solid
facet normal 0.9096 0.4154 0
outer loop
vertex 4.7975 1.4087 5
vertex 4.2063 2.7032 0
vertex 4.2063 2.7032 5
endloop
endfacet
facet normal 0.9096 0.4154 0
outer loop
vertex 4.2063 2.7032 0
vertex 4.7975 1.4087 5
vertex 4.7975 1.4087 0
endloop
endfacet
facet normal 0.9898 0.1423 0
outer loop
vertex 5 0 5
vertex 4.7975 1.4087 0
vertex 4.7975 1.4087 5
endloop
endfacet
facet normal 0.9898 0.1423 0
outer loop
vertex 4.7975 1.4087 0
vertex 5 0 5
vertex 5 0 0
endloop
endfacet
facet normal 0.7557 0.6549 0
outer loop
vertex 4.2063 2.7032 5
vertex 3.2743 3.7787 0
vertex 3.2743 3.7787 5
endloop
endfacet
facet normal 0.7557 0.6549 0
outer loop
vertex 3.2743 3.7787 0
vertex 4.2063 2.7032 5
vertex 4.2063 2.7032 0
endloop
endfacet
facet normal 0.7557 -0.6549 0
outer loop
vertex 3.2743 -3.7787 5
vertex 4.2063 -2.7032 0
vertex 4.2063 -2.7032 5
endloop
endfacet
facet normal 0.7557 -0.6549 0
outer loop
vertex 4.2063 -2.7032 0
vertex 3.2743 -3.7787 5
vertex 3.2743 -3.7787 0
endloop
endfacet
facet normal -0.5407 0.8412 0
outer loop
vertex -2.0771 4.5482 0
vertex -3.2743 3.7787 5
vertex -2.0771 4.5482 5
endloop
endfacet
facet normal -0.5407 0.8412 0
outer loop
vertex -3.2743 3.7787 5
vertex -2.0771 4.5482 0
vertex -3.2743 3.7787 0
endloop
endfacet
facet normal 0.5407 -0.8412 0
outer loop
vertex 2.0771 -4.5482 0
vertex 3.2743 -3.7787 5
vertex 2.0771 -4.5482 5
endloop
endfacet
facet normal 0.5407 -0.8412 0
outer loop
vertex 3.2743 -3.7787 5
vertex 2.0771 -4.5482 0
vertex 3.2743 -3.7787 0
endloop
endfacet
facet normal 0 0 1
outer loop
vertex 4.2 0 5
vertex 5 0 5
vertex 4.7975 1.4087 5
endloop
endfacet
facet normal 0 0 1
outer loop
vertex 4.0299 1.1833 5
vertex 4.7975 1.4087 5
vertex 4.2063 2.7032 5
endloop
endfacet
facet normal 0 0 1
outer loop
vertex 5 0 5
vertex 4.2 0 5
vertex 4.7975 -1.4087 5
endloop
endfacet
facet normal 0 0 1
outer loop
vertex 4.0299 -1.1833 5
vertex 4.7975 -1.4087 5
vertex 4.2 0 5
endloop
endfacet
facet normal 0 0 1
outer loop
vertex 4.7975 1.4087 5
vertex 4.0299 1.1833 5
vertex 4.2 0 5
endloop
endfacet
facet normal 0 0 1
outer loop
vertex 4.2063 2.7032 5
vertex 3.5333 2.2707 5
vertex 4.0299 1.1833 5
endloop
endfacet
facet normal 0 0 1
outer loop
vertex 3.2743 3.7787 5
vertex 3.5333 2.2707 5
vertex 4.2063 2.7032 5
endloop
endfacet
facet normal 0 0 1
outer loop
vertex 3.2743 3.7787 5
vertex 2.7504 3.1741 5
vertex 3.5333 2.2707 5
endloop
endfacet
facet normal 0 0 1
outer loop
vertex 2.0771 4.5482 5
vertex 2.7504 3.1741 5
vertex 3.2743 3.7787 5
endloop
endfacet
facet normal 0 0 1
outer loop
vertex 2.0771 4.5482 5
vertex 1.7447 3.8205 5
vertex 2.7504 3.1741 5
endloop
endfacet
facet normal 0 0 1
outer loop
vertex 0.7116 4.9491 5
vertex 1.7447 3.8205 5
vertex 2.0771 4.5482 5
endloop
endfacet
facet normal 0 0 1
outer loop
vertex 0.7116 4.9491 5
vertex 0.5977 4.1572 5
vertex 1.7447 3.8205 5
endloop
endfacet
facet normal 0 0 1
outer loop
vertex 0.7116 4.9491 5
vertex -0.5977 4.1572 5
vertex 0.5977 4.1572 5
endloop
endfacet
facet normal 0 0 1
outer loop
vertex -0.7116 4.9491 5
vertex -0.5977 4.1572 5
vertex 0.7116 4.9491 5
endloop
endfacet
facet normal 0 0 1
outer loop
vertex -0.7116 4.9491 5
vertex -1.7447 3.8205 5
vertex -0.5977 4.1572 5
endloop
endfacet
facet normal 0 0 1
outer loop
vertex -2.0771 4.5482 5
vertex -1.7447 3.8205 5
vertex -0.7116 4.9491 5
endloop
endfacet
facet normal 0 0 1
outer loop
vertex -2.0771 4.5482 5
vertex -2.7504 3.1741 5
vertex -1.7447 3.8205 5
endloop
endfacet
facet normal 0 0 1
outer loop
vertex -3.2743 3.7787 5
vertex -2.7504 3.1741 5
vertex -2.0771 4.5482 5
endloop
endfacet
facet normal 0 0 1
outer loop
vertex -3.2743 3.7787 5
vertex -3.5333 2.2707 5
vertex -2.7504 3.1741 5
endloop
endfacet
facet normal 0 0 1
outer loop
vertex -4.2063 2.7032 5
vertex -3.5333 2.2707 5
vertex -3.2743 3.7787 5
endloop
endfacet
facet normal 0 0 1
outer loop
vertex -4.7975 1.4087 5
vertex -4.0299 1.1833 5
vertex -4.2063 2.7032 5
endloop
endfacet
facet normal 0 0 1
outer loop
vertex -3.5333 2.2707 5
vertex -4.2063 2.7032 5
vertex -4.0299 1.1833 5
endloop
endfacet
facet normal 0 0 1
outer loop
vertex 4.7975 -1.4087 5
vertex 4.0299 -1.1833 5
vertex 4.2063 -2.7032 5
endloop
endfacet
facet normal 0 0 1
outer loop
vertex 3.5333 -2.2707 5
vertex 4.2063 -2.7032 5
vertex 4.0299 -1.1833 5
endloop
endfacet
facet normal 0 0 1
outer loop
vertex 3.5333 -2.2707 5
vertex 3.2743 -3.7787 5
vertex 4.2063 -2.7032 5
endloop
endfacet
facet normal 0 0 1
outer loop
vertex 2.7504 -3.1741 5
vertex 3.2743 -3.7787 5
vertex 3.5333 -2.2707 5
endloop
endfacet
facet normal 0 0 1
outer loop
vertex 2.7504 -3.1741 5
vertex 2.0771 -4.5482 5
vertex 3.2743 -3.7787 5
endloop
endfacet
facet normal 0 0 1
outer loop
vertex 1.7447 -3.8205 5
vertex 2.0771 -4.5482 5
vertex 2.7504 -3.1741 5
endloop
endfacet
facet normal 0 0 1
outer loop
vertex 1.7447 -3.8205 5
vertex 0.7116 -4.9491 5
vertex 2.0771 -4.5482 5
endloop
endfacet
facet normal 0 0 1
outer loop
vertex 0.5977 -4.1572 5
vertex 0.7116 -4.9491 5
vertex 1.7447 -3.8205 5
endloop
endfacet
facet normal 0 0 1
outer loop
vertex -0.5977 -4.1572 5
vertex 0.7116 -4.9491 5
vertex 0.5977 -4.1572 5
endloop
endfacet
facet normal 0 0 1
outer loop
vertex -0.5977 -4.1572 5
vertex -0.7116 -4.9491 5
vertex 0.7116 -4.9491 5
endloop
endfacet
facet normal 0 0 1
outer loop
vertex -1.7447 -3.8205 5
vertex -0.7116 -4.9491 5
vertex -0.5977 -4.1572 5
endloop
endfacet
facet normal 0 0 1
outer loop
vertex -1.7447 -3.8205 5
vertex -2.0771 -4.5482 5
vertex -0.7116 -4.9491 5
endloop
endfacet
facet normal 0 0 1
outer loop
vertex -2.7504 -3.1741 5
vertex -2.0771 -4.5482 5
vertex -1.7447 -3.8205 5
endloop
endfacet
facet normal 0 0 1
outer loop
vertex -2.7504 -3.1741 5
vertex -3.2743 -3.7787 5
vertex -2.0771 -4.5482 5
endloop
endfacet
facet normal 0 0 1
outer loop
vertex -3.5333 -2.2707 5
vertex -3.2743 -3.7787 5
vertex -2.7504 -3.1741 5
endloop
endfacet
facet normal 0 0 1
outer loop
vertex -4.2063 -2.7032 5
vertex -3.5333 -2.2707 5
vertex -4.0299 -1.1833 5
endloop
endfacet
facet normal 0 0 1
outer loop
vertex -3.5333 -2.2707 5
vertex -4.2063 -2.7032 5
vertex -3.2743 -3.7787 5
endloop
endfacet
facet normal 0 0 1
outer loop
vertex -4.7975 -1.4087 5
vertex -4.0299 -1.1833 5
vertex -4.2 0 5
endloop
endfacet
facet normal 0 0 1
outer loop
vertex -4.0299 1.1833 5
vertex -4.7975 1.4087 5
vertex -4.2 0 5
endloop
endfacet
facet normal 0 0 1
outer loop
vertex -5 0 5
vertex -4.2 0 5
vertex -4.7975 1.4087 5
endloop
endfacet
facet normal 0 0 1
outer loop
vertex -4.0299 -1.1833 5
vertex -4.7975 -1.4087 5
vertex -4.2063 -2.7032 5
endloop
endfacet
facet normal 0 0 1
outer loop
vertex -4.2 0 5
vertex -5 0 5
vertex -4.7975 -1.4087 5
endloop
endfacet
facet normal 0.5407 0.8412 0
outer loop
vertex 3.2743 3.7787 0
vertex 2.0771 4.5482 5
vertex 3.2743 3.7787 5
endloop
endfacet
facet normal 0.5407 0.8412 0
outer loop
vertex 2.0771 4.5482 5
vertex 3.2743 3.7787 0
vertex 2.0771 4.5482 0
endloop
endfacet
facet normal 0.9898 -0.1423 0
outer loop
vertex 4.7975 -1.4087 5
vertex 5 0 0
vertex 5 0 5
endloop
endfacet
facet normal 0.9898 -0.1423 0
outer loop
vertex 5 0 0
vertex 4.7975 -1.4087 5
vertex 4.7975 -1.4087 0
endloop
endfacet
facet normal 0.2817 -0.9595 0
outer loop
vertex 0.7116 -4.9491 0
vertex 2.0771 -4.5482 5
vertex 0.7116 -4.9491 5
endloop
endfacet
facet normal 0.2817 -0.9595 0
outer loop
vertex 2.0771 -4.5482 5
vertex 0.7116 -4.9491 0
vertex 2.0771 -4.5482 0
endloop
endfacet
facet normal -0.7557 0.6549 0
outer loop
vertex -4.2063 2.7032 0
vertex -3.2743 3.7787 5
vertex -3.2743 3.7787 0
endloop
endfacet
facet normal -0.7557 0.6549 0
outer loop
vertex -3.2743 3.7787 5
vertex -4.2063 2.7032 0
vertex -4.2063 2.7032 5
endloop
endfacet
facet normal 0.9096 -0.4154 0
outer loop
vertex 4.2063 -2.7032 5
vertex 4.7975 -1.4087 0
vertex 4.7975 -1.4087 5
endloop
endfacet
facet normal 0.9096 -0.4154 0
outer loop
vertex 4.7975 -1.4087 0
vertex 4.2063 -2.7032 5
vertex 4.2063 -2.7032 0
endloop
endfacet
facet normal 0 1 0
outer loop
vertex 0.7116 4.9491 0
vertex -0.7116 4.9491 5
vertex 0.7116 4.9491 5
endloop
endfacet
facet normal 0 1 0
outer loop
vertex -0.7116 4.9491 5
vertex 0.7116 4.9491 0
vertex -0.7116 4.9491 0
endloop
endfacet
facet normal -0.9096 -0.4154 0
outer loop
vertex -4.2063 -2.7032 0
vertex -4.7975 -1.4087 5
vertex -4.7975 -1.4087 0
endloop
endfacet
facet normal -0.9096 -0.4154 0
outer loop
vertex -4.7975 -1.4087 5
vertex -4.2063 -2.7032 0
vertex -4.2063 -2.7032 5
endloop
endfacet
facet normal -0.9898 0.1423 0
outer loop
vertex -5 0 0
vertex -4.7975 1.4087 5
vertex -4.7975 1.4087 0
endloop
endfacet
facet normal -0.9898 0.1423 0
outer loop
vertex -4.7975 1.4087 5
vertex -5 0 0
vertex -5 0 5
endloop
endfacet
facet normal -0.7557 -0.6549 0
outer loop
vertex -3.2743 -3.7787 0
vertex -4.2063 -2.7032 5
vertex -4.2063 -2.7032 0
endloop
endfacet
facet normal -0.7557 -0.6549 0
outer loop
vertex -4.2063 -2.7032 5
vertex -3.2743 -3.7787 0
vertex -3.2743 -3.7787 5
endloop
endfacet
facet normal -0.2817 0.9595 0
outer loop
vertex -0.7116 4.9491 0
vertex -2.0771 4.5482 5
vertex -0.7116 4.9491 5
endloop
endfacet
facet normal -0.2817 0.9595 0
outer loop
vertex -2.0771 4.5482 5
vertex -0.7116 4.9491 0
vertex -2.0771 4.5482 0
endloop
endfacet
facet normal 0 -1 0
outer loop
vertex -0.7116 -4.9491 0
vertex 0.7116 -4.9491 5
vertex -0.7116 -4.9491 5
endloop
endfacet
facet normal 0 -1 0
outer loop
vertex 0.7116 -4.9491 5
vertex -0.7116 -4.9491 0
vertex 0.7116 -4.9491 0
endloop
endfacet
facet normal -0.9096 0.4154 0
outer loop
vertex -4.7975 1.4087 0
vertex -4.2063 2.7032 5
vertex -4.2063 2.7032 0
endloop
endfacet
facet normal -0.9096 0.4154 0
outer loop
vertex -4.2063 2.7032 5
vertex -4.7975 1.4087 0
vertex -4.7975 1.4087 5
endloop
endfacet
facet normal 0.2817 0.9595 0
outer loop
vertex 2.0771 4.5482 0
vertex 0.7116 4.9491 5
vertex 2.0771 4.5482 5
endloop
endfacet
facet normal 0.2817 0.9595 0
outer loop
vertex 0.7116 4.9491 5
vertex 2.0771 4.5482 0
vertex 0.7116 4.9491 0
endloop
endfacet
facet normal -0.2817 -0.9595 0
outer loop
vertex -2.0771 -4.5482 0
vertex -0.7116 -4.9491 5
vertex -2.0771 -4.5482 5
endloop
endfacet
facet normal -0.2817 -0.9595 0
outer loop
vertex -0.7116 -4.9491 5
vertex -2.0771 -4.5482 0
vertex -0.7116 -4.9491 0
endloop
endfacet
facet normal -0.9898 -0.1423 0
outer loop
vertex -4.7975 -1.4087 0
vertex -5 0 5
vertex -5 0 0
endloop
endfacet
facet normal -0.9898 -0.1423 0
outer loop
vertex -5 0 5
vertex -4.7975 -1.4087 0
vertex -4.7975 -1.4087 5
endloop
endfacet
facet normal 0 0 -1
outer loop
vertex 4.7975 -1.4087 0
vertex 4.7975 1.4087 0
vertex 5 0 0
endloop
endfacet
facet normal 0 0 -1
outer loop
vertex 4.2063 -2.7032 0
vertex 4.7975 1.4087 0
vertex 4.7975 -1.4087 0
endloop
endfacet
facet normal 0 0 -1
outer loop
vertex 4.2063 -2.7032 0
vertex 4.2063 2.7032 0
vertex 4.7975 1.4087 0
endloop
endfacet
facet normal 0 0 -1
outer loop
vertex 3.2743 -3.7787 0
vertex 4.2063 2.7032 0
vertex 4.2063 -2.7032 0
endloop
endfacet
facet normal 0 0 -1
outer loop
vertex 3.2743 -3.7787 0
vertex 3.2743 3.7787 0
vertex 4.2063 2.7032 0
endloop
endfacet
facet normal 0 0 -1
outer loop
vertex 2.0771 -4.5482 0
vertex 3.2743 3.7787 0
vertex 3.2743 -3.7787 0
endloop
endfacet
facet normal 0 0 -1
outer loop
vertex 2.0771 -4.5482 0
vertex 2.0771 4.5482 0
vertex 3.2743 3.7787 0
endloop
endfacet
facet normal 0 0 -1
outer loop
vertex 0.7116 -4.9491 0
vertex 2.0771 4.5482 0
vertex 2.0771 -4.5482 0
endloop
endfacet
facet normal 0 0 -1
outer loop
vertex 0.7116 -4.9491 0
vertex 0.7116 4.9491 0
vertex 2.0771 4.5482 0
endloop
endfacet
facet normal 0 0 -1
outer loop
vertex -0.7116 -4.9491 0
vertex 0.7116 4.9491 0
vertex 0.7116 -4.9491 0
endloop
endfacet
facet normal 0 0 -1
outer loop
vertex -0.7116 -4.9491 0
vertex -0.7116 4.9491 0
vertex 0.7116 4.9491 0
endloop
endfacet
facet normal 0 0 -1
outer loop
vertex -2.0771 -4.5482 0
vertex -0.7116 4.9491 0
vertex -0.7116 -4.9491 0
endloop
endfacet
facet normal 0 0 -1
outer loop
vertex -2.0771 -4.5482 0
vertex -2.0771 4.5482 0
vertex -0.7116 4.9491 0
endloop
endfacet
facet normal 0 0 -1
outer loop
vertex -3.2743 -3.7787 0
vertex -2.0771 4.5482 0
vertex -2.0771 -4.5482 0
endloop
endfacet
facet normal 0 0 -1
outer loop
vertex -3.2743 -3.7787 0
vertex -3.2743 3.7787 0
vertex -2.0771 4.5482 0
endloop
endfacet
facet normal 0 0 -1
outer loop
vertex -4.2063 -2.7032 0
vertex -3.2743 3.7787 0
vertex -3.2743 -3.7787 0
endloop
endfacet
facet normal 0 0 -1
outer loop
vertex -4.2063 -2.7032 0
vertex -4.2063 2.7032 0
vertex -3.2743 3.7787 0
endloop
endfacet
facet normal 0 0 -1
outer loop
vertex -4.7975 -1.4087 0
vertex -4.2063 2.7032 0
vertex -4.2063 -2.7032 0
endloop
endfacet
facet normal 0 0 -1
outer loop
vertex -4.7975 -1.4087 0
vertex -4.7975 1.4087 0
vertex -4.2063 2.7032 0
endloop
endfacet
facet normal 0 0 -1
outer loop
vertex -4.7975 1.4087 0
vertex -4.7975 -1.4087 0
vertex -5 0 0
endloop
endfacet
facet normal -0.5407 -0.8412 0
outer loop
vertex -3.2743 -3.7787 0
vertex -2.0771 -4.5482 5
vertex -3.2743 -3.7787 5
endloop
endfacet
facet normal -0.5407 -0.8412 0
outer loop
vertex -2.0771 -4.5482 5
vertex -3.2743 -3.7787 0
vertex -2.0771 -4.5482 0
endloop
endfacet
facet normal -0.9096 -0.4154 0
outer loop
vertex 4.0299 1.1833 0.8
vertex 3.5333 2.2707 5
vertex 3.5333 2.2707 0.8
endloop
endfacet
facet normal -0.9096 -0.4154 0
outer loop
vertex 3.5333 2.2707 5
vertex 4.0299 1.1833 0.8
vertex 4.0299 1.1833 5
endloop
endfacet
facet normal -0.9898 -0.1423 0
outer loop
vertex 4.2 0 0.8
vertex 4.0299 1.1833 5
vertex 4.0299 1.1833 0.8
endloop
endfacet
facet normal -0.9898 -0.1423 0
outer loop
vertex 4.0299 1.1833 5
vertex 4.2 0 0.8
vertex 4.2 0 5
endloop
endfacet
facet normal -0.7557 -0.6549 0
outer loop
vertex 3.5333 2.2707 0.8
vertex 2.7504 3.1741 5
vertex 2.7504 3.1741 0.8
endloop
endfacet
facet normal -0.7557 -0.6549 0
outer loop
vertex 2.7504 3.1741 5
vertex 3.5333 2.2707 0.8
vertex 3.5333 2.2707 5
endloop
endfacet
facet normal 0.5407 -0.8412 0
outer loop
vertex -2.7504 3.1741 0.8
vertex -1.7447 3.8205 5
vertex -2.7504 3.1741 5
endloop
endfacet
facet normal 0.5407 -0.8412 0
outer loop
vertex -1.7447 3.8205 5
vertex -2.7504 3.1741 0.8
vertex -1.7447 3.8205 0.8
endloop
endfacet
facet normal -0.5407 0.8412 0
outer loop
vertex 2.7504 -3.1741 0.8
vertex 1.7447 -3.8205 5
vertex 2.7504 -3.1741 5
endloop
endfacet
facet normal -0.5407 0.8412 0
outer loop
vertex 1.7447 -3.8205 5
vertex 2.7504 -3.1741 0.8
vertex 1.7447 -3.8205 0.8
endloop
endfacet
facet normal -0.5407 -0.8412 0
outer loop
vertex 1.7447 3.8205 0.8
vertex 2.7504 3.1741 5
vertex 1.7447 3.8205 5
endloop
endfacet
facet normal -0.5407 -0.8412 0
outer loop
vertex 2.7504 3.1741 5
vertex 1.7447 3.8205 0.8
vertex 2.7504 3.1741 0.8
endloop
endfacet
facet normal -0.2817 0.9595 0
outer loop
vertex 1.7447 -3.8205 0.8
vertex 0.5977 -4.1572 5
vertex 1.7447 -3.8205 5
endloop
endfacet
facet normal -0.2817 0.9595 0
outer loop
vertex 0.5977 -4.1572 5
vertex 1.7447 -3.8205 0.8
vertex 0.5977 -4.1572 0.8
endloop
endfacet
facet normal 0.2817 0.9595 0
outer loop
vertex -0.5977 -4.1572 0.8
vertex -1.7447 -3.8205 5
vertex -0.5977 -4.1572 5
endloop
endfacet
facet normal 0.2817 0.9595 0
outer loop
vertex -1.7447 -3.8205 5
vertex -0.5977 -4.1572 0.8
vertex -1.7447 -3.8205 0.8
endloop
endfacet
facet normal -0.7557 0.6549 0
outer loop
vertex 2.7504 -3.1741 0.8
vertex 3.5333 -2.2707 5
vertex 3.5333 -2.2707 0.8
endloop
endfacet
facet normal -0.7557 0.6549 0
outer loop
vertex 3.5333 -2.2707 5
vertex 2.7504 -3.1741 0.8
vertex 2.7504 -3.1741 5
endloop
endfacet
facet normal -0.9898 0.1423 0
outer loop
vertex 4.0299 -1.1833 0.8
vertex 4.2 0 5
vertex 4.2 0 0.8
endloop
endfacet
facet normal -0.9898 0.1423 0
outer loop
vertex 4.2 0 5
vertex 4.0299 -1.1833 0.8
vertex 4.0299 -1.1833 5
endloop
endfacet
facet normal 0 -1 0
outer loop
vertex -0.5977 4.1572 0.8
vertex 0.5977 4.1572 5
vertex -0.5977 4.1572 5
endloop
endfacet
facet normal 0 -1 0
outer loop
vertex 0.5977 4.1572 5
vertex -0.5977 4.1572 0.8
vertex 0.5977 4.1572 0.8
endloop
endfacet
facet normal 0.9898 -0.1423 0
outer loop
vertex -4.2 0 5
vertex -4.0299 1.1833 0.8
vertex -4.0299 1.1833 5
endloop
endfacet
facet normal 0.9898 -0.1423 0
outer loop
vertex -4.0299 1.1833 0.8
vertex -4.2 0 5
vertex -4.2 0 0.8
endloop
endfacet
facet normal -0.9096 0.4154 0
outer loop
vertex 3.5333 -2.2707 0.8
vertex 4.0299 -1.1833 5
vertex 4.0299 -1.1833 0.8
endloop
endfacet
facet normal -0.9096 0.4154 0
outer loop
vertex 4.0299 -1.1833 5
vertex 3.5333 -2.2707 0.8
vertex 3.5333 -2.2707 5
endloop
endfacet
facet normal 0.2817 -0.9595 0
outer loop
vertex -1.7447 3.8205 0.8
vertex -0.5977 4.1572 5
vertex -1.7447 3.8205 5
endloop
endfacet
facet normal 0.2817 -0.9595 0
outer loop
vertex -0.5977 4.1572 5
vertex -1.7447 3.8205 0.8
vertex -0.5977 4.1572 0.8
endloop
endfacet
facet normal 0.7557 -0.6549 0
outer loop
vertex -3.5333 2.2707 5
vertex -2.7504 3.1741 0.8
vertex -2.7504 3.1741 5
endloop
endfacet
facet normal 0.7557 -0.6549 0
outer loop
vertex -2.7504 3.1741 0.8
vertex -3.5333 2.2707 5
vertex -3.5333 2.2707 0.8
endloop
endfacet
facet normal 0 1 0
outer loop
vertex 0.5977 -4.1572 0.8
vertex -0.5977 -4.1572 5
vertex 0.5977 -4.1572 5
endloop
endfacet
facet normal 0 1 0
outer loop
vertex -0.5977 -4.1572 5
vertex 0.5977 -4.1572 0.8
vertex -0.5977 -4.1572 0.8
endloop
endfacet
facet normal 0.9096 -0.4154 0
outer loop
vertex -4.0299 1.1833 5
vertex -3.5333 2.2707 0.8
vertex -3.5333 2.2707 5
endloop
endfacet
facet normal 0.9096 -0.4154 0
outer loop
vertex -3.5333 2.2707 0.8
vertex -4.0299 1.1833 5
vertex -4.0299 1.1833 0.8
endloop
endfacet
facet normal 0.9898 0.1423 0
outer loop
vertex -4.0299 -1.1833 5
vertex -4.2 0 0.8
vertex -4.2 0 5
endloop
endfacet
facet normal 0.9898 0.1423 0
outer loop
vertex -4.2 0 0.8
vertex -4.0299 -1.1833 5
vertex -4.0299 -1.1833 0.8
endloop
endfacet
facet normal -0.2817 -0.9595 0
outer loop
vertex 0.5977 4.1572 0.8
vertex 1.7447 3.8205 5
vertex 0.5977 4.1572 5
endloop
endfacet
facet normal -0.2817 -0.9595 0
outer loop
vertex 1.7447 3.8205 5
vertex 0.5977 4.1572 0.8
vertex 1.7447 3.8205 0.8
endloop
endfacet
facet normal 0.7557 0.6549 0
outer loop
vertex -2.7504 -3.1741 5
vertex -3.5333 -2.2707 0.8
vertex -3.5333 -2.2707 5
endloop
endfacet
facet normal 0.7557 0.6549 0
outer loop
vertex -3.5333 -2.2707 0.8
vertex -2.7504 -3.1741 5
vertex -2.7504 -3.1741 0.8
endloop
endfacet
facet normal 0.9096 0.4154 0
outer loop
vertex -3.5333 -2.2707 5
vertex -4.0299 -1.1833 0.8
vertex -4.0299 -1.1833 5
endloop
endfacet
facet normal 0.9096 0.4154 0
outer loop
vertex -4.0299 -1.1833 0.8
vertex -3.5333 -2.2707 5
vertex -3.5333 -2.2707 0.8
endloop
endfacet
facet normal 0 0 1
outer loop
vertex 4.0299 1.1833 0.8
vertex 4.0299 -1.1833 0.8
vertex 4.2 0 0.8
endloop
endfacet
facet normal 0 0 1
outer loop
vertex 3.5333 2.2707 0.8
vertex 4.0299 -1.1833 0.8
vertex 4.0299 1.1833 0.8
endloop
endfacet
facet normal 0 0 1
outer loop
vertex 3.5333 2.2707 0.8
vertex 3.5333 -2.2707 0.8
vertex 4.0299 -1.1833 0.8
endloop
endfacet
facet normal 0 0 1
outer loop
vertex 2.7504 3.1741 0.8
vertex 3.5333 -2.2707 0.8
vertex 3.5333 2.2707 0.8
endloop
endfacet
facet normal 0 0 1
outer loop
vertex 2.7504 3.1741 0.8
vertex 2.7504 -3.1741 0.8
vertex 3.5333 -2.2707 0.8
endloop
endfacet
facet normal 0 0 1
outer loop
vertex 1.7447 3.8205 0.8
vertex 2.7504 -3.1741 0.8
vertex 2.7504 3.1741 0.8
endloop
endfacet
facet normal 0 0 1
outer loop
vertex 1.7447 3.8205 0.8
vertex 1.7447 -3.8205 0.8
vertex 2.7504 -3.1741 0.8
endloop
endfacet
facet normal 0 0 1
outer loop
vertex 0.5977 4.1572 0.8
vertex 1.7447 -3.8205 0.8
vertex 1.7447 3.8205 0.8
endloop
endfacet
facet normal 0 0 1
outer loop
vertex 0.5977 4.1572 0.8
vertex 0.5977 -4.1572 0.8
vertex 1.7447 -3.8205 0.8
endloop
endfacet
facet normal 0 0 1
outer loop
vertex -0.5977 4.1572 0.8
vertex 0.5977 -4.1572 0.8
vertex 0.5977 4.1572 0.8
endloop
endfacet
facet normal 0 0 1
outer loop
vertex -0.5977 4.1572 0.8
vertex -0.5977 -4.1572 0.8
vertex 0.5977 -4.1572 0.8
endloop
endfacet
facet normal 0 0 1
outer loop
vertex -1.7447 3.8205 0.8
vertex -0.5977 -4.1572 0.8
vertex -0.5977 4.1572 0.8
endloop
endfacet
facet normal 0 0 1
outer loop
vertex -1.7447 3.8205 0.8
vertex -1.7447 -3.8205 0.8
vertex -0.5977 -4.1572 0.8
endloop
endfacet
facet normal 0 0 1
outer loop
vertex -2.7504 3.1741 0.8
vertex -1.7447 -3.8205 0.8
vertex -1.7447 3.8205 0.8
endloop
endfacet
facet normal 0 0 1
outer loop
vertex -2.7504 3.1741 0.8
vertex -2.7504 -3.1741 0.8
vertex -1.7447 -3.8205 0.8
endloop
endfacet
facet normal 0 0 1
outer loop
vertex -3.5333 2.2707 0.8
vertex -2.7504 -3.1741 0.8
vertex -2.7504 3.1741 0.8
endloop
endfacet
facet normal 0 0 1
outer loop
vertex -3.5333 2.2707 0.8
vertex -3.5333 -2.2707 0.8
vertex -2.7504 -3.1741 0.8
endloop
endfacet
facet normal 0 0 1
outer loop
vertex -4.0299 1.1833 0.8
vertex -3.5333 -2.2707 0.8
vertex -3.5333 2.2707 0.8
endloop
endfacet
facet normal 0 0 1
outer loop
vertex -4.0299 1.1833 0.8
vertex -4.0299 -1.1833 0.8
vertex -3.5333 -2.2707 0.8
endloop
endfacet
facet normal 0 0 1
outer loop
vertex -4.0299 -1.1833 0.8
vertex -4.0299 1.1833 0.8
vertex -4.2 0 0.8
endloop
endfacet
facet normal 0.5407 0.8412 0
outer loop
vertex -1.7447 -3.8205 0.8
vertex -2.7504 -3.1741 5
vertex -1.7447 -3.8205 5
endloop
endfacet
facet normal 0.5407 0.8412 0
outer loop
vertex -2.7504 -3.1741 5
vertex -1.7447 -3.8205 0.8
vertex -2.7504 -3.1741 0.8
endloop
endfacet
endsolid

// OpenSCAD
module legcup()
{
    diam = 10;
    height = 5;
    wall = 0.8;
    
    difference()
    {
        color([0.33,0.22,0.20, 1.0])
        cylinder(h=height,d=diam,$fn = 22);

        translate([0,0,wall])
        color([0.63,0.42,0.40, 1.0])
        cylinder(h=height,d=diam-2*wall,$fn = 22);
    }
}   

legcup();
